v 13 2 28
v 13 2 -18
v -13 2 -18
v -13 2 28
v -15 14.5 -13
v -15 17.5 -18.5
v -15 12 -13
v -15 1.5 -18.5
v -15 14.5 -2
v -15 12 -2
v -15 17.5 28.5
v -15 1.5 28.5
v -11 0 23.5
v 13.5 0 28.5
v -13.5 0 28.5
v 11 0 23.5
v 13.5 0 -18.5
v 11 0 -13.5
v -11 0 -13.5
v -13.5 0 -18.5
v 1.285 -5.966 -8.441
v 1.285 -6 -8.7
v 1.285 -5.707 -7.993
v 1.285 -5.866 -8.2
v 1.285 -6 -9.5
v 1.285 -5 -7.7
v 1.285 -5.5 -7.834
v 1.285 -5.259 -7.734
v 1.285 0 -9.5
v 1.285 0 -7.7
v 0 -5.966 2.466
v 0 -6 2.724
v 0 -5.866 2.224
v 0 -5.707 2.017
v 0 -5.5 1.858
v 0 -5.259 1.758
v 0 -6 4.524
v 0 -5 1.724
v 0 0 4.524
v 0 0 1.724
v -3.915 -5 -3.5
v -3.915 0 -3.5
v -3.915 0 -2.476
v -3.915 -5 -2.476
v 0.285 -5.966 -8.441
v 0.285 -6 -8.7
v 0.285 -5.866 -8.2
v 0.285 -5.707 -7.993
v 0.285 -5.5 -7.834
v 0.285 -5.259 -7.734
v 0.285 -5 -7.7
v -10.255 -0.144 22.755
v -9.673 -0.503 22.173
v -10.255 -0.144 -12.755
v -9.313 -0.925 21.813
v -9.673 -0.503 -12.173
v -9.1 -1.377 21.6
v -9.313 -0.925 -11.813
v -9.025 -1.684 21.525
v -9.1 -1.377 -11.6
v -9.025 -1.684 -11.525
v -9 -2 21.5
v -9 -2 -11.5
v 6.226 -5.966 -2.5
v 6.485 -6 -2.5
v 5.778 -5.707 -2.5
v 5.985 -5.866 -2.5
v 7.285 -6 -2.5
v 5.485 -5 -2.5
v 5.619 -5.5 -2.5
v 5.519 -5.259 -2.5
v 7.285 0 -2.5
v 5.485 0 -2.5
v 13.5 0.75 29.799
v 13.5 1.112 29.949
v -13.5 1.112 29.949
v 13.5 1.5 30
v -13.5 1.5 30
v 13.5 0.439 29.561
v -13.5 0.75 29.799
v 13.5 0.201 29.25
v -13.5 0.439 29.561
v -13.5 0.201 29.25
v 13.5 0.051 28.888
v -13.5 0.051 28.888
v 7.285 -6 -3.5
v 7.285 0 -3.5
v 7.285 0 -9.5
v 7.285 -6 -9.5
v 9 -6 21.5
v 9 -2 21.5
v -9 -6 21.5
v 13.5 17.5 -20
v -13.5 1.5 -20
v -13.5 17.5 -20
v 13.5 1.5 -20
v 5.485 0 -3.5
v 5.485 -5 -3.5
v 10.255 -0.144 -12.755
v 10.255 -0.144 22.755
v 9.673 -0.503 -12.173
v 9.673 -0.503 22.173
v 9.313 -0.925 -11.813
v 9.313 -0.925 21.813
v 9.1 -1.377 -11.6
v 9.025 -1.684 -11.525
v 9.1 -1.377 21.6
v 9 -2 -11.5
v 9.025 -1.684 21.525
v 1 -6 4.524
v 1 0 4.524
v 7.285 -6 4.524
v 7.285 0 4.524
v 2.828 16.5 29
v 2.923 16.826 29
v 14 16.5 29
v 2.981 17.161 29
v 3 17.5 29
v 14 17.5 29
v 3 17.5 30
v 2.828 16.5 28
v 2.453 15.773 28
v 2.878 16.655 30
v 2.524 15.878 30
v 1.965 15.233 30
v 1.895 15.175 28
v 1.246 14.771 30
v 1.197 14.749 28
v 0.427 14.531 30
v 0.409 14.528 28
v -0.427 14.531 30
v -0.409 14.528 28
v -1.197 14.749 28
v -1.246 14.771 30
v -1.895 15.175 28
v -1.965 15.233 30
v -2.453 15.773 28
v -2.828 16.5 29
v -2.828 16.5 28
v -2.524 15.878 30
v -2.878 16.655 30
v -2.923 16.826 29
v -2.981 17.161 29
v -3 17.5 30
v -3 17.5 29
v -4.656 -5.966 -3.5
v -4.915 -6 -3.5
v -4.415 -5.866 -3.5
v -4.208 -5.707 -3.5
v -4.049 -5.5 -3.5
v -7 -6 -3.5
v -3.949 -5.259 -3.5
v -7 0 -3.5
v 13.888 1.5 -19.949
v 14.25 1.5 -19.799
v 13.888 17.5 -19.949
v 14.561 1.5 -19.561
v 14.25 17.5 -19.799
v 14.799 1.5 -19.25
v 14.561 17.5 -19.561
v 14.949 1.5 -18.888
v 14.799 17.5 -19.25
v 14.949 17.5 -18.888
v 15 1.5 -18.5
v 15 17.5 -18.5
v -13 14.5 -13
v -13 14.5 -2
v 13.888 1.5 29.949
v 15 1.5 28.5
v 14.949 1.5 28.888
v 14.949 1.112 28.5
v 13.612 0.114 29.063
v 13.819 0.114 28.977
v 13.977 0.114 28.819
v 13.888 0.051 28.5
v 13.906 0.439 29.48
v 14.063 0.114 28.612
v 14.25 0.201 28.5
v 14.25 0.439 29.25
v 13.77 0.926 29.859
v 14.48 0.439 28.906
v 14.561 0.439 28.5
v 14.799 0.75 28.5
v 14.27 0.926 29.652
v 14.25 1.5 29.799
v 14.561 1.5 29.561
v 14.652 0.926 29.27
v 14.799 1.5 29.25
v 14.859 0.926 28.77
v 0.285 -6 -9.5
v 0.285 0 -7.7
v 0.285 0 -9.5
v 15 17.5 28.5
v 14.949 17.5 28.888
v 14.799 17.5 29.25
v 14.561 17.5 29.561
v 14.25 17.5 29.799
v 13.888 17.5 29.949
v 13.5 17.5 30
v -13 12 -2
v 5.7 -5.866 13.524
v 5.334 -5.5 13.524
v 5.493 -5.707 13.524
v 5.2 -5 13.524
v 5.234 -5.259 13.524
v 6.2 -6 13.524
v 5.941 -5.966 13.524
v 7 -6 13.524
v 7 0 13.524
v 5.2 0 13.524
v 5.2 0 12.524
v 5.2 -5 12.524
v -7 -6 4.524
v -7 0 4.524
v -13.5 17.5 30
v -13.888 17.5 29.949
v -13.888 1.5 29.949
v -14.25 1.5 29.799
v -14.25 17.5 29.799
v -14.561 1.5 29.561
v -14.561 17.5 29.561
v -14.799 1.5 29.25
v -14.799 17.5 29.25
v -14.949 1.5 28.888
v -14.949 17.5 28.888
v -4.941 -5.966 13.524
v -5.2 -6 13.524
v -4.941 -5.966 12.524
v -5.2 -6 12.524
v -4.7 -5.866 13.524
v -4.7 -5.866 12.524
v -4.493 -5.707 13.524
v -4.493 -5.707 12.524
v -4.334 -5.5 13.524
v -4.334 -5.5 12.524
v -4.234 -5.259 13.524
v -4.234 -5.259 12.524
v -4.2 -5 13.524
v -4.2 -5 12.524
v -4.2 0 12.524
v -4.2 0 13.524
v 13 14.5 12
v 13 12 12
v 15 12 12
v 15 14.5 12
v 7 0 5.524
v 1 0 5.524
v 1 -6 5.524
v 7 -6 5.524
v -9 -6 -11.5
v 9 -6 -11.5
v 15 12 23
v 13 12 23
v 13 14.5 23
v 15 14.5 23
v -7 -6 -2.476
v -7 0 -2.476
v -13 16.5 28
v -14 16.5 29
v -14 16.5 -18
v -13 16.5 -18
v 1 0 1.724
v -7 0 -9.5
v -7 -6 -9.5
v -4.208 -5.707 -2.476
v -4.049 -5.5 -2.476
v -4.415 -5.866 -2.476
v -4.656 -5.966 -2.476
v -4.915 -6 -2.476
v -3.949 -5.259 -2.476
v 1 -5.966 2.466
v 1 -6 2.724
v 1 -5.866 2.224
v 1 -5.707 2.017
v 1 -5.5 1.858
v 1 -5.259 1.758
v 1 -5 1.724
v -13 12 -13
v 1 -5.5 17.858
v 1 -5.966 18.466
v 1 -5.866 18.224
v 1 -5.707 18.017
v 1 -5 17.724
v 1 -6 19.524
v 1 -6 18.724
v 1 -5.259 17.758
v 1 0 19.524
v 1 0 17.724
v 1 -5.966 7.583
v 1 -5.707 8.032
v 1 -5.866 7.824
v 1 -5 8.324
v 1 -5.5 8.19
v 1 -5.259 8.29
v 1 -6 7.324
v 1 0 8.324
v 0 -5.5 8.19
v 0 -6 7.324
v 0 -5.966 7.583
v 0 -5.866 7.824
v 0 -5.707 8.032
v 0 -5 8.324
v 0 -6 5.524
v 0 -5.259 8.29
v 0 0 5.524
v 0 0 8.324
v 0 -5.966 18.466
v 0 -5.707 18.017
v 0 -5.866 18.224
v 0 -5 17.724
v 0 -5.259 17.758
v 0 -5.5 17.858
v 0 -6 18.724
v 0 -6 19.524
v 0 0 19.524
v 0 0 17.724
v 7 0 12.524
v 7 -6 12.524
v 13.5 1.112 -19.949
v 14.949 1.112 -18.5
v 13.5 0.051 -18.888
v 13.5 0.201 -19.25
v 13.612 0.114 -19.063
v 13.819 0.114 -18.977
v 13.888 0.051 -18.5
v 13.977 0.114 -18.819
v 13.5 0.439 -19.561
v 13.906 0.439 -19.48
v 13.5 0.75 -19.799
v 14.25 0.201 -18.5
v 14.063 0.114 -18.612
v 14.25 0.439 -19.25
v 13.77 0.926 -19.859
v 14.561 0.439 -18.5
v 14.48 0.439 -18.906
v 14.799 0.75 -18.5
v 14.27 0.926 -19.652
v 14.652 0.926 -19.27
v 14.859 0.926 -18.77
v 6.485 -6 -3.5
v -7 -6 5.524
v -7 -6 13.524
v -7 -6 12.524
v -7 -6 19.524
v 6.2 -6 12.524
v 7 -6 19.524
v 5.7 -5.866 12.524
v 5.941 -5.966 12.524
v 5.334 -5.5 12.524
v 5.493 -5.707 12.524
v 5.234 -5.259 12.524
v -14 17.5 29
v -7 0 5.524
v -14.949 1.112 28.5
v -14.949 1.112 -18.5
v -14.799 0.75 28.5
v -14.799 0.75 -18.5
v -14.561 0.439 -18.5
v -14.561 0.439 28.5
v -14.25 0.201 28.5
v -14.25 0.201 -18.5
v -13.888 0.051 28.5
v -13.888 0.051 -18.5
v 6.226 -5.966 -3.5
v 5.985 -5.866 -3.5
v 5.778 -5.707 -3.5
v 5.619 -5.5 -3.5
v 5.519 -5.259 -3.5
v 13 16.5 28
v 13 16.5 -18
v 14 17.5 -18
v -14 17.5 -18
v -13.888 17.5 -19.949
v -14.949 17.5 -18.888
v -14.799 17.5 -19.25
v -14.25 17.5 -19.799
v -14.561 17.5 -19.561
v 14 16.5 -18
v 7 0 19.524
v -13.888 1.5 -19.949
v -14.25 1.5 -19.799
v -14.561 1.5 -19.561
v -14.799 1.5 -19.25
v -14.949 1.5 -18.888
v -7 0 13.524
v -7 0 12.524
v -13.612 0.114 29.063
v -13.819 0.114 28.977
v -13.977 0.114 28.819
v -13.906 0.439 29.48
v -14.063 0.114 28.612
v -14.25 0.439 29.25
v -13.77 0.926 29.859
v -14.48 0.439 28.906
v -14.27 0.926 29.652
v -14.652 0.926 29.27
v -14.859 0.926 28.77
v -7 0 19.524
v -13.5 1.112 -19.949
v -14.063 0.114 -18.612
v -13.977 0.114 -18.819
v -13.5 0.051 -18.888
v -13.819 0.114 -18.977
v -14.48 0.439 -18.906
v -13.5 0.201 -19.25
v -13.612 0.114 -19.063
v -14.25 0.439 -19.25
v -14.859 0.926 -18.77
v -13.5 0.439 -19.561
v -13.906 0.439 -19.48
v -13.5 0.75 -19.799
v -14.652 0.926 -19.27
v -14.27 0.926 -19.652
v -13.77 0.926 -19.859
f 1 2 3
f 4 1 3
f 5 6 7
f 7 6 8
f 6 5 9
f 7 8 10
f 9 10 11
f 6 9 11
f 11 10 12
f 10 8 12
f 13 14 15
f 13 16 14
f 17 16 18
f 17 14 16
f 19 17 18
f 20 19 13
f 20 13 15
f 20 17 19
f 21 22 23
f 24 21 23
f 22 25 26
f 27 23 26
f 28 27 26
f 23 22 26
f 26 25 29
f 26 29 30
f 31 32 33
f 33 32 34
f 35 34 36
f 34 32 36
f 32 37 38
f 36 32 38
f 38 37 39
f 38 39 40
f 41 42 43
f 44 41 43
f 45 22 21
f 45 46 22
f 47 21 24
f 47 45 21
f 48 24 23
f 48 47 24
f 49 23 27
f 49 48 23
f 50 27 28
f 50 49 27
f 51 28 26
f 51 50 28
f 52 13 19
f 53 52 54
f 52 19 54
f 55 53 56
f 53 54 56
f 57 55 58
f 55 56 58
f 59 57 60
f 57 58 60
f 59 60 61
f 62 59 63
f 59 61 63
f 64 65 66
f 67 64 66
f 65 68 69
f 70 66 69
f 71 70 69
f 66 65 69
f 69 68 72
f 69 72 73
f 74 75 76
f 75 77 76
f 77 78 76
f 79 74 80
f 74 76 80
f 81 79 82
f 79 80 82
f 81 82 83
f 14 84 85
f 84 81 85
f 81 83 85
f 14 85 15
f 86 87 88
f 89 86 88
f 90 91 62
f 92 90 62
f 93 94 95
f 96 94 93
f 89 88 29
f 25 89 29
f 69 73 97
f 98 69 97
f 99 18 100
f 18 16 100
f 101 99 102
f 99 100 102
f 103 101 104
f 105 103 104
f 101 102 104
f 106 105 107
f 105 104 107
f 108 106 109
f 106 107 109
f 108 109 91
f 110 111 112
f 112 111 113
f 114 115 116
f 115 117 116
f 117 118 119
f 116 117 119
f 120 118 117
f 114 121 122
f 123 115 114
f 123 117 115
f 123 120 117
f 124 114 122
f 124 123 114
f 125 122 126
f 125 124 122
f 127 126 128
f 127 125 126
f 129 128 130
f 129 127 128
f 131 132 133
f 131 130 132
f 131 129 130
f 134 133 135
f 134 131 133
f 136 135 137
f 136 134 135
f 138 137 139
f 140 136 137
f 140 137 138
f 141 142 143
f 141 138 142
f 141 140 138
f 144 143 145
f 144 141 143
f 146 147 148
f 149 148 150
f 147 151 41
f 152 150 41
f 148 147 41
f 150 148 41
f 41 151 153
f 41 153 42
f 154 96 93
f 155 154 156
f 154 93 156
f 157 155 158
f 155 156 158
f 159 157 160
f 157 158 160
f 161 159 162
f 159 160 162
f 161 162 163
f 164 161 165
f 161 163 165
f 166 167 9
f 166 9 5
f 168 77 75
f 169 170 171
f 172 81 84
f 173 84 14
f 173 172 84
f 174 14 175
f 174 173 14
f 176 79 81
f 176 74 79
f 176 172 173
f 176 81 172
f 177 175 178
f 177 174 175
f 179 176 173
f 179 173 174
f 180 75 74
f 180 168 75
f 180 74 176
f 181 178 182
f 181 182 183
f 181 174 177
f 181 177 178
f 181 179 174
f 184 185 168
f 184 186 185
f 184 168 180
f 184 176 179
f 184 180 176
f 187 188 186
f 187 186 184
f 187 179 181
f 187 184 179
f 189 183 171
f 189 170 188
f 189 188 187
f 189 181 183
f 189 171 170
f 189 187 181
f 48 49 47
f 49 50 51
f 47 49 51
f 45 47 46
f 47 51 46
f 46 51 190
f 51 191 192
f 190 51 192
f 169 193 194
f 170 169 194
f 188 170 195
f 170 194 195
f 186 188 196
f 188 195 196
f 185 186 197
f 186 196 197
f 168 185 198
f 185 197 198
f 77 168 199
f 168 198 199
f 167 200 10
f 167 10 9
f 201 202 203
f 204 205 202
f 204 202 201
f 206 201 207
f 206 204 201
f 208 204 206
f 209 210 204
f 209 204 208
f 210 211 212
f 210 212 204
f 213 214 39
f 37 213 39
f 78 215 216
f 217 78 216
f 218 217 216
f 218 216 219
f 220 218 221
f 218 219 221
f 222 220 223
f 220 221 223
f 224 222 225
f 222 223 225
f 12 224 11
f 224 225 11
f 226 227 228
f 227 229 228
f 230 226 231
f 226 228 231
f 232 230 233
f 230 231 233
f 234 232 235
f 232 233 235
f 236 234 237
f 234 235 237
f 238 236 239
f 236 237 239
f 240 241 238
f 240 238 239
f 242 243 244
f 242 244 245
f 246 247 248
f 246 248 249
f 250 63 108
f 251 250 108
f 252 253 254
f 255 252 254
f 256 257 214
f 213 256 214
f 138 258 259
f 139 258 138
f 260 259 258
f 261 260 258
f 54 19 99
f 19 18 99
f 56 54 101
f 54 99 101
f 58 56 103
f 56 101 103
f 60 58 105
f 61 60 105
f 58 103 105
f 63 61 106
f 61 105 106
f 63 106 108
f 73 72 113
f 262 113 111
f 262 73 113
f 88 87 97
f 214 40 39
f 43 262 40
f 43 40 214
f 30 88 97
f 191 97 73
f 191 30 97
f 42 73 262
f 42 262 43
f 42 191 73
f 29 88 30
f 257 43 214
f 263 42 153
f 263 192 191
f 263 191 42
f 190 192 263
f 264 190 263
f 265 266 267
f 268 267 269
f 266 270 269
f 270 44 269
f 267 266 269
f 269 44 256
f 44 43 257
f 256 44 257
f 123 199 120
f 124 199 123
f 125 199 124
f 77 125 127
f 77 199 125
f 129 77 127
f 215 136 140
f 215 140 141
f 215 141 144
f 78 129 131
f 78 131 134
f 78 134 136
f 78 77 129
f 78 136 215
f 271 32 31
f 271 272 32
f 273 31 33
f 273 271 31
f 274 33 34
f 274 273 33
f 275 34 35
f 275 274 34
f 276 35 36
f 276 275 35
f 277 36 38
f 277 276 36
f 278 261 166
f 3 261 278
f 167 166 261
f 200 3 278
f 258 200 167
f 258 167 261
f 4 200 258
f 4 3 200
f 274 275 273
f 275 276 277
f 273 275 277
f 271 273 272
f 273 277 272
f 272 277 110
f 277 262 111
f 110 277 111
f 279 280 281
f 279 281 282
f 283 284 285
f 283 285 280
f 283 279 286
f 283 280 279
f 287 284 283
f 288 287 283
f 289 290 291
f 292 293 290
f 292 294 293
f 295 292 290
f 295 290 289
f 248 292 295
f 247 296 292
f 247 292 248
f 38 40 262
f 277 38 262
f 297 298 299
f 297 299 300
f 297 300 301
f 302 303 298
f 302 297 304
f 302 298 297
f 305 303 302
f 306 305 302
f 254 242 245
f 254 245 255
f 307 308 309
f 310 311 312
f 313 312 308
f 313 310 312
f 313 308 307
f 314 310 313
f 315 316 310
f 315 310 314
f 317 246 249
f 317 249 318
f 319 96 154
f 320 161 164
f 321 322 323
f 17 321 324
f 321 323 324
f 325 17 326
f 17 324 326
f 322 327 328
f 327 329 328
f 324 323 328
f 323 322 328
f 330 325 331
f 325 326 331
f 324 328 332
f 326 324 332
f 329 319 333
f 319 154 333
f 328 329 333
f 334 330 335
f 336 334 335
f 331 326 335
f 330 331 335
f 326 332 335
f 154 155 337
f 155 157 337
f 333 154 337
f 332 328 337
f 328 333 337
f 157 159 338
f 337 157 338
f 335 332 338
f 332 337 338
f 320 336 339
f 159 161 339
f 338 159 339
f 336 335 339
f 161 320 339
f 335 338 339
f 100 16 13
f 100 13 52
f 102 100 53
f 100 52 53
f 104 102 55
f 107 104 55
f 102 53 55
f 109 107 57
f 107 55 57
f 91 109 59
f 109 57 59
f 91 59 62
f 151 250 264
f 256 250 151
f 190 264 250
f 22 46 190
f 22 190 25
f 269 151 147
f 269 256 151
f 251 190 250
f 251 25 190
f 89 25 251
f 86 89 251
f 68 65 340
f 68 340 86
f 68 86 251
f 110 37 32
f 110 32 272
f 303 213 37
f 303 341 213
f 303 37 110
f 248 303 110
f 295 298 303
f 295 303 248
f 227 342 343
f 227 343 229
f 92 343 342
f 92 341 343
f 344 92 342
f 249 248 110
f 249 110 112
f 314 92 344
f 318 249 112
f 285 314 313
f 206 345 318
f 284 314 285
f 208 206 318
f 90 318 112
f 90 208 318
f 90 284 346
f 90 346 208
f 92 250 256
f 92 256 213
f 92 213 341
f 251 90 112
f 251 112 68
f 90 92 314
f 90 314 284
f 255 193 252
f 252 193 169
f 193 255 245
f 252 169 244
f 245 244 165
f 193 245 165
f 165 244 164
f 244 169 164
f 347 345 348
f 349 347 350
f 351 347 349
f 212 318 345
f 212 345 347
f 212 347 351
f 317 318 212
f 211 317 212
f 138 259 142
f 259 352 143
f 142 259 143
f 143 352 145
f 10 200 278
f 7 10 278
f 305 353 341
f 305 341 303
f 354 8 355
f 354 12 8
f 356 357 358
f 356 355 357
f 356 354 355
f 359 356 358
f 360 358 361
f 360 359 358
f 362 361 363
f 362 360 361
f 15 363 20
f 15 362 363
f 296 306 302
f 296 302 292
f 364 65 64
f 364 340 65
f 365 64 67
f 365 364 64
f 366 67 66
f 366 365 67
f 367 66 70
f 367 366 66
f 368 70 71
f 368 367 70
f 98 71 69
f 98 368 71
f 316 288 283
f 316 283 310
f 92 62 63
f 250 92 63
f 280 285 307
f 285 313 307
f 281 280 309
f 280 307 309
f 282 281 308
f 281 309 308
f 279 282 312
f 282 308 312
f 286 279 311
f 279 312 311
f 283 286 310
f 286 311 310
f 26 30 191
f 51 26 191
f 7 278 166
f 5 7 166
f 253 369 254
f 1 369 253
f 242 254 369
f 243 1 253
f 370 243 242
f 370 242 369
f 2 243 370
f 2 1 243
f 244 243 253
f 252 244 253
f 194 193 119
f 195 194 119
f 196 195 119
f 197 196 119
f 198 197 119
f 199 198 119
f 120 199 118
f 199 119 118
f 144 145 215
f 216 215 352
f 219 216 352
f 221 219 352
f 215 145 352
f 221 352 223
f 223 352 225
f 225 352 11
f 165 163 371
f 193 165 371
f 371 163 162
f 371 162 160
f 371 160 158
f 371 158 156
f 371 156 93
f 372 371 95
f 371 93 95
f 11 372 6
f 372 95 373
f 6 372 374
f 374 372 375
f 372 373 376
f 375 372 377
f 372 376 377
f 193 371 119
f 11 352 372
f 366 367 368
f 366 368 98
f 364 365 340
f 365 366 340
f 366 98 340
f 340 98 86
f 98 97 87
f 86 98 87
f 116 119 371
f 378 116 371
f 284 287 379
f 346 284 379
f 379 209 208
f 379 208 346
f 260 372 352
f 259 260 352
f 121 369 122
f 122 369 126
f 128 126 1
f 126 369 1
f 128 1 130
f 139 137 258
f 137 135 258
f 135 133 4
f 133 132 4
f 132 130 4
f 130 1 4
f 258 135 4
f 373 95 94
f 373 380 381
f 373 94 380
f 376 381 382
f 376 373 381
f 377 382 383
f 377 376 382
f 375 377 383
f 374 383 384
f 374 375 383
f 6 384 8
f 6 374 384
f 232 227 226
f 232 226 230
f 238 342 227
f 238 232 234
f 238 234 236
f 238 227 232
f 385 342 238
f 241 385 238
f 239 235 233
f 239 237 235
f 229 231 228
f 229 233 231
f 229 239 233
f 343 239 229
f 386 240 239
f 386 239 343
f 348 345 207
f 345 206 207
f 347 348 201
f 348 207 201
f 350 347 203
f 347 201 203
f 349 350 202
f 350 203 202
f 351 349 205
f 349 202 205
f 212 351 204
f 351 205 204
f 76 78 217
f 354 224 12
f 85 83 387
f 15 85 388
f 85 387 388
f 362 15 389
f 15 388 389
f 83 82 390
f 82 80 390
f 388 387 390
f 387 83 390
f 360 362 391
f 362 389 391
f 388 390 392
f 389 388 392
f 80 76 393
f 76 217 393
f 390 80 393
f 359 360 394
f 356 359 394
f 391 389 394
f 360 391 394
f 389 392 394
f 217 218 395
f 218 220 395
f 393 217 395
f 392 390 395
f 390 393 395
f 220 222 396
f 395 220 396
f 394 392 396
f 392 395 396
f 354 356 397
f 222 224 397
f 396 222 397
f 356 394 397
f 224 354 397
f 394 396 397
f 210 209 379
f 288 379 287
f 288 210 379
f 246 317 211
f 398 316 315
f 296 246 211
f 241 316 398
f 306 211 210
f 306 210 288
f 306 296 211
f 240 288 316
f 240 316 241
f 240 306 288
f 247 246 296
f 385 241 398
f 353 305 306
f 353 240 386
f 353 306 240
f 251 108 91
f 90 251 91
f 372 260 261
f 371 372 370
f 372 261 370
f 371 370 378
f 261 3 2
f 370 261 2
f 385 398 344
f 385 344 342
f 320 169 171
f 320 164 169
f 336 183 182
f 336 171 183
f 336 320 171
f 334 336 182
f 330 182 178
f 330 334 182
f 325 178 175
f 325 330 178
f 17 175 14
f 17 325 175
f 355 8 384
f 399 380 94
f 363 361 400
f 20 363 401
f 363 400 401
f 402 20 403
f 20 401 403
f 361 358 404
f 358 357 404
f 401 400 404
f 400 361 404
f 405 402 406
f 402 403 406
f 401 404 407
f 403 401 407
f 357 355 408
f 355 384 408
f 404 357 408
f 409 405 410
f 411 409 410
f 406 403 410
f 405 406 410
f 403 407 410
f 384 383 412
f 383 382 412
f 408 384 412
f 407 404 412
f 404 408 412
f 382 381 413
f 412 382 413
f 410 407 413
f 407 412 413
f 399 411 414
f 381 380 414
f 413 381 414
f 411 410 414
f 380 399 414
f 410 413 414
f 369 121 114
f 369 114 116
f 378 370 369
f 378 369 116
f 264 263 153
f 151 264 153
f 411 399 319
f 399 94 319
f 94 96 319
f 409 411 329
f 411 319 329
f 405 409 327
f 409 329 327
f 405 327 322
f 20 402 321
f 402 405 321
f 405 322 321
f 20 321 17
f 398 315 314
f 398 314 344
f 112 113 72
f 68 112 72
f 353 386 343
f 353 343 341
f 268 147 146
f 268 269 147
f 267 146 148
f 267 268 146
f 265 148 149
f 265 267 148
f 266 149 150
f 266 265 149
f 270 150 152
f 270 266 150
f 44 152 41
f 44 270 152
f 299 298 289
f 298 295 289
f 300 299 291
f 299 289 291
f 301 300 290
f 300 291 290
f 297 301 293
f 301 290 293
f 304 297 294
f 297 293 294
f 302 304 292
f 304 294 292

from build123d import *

# Parameters (mm, degrees)
BOSS_EXTRUDE1_DEPTH = 17.5
SHELL1_T            = -2
FILLET1_R           = 1.5
CUT_EXTRUDE3_REACH  = 4
SKETCH7_W           = 11
SKETCH7_H           = 2.5
CUT_EXTRUDE4_REACH  = 4
SKETCH8_W           = 11
SKETCH8_H           = 2.5
CUT_EXTRUDE5_DEPTH  = 1
CUT_EXTRUDE6_REACH  = 52
BOSS_EXTRUDE2_DEPTH = 6
FILLET2_R           = 2
FILLET3_R           = 1


with BuildPart() as part:
    # Sketch1 → Boss-Extrude1 (new body)
    with BuildSketch(Plane(origin=(0, 0, 0), x_dir=(1, 0, 0), z_dir=(0, 1, 0))):
        Polygon((-15, 20), (15, 20), (15, -20), (15, -30), (-15, -30), (-15, -20), align=None)
    extrude(amount=BOSS_EXTRUDE1_DEPTH)

    # Shell1
    shell1_openings = [part.faces().sort_by_distance(p)[0] for p in [
        (0, 17.5, 5),
    ]]
    offset(amount=SHELL1_T, openings=shell1_openings, kind=Kind.INTERSECTION)

    # Fillet1
    fillet1_edges = [part.edges().sort_by_distance(p)[0] for p in [
        (15, 8.75, 30),
        (-15, 8.75, 30),
        (-15, 8.75, -20),
        (15, 8.75, -20),
        (0, 0, 30),
        (-15, 0, 5),
        (0, 0, -20),
        (15, 0, 5),
    ]]
    fillet(fillet1_edges, radius=FILLET1_R)

    # Sketch7 → Cut-Extrude3 (cut, up to next)
    with BuildSketch(Plane.ZY.offset(-13), mode=Mode.PRIVATE) as cut_extrude3_sk1:
        with Locations((17.5, 13.25)):
            Rectangle(SKETCH7_W, SKETCH7_H)
    cut_extrude3_tool1 = extrude(cut_extrude3_sk1.sketch, amount=-CUT_EXTRUDE3_REACH, mode=Mode.PRIVATE) & part.part
    add(cut_extrude3_tool1.solids().sort_by_distance((13, 13.25, 17.5))[0], mode=Mode.SUBTRACT)

    # Sketch8 → Cut-Extrude4 (cut, up to next)
    with BuildSketch(Plane(origin=(-13, 0, 0), x_dir=(0, 0, -1), z_dir=(1, 0, 0)), mode=Mode.PRIVATE) as cut_extrude4_sk1:
        with Locations((7.5, 13.25)):
            Rectangle(SKETCH8_W, SKETCH8_H)
    cut_extrude4_tool1 = extrude(cut_extrude4_sk1.sketch, amount=-CUT_EXTRUDE4_REACH, mode=Mode.PRIVATE) & part.part
    add(cut_extrude4_tool1.solids().sort_by_distance((-13, 13.25, -7.5))[0], mode=Mode.SUBTRACT)

    # Sketch9 → Cut-Extrude5 (cut)
    with BuildSketch(Plane(origin=(0, 17.5, 0), x_dir=(1, 0, 0), z_dir=(0, 1, 0))):
        Polygon((-13, 18), (-14, 18), (-14, -19), (-14, -29), (14, -29), (14, -19), (14, 18), (13, 18), (13, -18), (13, -28), (-13, -28), (-13, -18), align=None)
    extrude(amount=-CUT_EXTRUDE5_DEPTH, mode=Mode.SUBTRACT)

    # Sketch10 → Cut-Extrude6 (cut, up to next)
    with BuildSketch(Plane.XY.offset(30), mode=Mode.PRIVATE) as cut_extrude6_sk1:
        with BuildLine():
            Line((-3, 17.5), (3, 17.5))
            ThreePointArc((3, 17.5), (0, 14.5), (-3, 17.5))
        make_face()
    cut_extrude6_tool1 = extrude(cut_extrude6_sk1.sketch, amount=-CUT_EXTRUDE6_REACH, mode=Mode.PRIVATE) & part.part
    add(cut_extrude6_tool1.solids().sort_by_distance((0, 16.22676, 30))[0], mode=Mode.SUBTRACT)

    # Sketch11 → Boss-Extrude2 (add)
    with BuildSketch(Plane.XZ):
        Polygon((-9, 21.5), (-9, -11.5), (6.25, -11.5), (9, -11.5), (9, 21.5), (7, 21.5), align=None)
        Polygon((-7, 5.524400968), (0, 5.524400968), (0, 8.324400968), (1, 8.324400968), (1, 5.524400968), (7, 5.524400968), (7, 12.524400968), (5.2, 12.524400968), (5.2, 13.524400968), (7, 13.524400968), (7, 19.524400968), (6.25, 19.524400968), (1, 19.524400968), (1, 17.724400968), (0, 17.724400968), (0, 19.524400968), (-7, 19.524400968), (-7, 13.524400968), (-4.2, 13.524400968), (-4.2, 12.524400968), (-7, 12.524400968), align=None, mode=Mode.SUBTRACT)
        Polygon((7.285005864, -9.5), (6.535005864, -9.5), (1.285005864, -9.5), (1.285005864, -7.7), (0.285005864, -7.7), (0.285005864, -9.5), (-6.714994136, -9.5), (-7, -9.5), (-7, -3.5), (-6.714994136, -3.5), (-3.914994136, -3.5), (-3.914994136, -2.475599032), (-7, -2.475599032), (-7, 4.524400968), (0, 4.524400968), (0, 1.724400968), (1, 1.724400968), (1, 4.524400968), (7.285005864, 4.524400968), (7.285005864, -2.5), (5.485005864, -2.5), (5.485005864, -3.5), (7.285005864, -3.5), align=None, mode=Mode.SUBTRACT)
    extrude(amount=BOSS_EXTRUDE2_DEPTH)

    # Fillet2
    fillet2_edges = [part.edges().sort_by_distance(p)[0] for p in [
        (-9, 0, 5),
        (0, 0, -11.5),
        (0, 0, 21.5),
        (9, 0, 5),
    ]]
    fillet(fillet2_edges, radius=FILLET2_R)

    # Fillet3
    fillet3_edges = [part.edges().sort_by_distance(p)[0] for p in [
        (0.785005864, -6, -7.7),
        (5.2, -6, 13.024400968),
        (0.5, -6, 8.324400968),
        (-4.2, -6, 13.024400968),
        (0.5, -6, 17.724400968),
        (-3.914994136, -6, -2.987799516),
        (0.5, -6, 1.724400968),
        (5.485005864, -6, -3),
    ]]
    fillet(fillet3_edges, radius=FILLET3_R)


solid = part.part
